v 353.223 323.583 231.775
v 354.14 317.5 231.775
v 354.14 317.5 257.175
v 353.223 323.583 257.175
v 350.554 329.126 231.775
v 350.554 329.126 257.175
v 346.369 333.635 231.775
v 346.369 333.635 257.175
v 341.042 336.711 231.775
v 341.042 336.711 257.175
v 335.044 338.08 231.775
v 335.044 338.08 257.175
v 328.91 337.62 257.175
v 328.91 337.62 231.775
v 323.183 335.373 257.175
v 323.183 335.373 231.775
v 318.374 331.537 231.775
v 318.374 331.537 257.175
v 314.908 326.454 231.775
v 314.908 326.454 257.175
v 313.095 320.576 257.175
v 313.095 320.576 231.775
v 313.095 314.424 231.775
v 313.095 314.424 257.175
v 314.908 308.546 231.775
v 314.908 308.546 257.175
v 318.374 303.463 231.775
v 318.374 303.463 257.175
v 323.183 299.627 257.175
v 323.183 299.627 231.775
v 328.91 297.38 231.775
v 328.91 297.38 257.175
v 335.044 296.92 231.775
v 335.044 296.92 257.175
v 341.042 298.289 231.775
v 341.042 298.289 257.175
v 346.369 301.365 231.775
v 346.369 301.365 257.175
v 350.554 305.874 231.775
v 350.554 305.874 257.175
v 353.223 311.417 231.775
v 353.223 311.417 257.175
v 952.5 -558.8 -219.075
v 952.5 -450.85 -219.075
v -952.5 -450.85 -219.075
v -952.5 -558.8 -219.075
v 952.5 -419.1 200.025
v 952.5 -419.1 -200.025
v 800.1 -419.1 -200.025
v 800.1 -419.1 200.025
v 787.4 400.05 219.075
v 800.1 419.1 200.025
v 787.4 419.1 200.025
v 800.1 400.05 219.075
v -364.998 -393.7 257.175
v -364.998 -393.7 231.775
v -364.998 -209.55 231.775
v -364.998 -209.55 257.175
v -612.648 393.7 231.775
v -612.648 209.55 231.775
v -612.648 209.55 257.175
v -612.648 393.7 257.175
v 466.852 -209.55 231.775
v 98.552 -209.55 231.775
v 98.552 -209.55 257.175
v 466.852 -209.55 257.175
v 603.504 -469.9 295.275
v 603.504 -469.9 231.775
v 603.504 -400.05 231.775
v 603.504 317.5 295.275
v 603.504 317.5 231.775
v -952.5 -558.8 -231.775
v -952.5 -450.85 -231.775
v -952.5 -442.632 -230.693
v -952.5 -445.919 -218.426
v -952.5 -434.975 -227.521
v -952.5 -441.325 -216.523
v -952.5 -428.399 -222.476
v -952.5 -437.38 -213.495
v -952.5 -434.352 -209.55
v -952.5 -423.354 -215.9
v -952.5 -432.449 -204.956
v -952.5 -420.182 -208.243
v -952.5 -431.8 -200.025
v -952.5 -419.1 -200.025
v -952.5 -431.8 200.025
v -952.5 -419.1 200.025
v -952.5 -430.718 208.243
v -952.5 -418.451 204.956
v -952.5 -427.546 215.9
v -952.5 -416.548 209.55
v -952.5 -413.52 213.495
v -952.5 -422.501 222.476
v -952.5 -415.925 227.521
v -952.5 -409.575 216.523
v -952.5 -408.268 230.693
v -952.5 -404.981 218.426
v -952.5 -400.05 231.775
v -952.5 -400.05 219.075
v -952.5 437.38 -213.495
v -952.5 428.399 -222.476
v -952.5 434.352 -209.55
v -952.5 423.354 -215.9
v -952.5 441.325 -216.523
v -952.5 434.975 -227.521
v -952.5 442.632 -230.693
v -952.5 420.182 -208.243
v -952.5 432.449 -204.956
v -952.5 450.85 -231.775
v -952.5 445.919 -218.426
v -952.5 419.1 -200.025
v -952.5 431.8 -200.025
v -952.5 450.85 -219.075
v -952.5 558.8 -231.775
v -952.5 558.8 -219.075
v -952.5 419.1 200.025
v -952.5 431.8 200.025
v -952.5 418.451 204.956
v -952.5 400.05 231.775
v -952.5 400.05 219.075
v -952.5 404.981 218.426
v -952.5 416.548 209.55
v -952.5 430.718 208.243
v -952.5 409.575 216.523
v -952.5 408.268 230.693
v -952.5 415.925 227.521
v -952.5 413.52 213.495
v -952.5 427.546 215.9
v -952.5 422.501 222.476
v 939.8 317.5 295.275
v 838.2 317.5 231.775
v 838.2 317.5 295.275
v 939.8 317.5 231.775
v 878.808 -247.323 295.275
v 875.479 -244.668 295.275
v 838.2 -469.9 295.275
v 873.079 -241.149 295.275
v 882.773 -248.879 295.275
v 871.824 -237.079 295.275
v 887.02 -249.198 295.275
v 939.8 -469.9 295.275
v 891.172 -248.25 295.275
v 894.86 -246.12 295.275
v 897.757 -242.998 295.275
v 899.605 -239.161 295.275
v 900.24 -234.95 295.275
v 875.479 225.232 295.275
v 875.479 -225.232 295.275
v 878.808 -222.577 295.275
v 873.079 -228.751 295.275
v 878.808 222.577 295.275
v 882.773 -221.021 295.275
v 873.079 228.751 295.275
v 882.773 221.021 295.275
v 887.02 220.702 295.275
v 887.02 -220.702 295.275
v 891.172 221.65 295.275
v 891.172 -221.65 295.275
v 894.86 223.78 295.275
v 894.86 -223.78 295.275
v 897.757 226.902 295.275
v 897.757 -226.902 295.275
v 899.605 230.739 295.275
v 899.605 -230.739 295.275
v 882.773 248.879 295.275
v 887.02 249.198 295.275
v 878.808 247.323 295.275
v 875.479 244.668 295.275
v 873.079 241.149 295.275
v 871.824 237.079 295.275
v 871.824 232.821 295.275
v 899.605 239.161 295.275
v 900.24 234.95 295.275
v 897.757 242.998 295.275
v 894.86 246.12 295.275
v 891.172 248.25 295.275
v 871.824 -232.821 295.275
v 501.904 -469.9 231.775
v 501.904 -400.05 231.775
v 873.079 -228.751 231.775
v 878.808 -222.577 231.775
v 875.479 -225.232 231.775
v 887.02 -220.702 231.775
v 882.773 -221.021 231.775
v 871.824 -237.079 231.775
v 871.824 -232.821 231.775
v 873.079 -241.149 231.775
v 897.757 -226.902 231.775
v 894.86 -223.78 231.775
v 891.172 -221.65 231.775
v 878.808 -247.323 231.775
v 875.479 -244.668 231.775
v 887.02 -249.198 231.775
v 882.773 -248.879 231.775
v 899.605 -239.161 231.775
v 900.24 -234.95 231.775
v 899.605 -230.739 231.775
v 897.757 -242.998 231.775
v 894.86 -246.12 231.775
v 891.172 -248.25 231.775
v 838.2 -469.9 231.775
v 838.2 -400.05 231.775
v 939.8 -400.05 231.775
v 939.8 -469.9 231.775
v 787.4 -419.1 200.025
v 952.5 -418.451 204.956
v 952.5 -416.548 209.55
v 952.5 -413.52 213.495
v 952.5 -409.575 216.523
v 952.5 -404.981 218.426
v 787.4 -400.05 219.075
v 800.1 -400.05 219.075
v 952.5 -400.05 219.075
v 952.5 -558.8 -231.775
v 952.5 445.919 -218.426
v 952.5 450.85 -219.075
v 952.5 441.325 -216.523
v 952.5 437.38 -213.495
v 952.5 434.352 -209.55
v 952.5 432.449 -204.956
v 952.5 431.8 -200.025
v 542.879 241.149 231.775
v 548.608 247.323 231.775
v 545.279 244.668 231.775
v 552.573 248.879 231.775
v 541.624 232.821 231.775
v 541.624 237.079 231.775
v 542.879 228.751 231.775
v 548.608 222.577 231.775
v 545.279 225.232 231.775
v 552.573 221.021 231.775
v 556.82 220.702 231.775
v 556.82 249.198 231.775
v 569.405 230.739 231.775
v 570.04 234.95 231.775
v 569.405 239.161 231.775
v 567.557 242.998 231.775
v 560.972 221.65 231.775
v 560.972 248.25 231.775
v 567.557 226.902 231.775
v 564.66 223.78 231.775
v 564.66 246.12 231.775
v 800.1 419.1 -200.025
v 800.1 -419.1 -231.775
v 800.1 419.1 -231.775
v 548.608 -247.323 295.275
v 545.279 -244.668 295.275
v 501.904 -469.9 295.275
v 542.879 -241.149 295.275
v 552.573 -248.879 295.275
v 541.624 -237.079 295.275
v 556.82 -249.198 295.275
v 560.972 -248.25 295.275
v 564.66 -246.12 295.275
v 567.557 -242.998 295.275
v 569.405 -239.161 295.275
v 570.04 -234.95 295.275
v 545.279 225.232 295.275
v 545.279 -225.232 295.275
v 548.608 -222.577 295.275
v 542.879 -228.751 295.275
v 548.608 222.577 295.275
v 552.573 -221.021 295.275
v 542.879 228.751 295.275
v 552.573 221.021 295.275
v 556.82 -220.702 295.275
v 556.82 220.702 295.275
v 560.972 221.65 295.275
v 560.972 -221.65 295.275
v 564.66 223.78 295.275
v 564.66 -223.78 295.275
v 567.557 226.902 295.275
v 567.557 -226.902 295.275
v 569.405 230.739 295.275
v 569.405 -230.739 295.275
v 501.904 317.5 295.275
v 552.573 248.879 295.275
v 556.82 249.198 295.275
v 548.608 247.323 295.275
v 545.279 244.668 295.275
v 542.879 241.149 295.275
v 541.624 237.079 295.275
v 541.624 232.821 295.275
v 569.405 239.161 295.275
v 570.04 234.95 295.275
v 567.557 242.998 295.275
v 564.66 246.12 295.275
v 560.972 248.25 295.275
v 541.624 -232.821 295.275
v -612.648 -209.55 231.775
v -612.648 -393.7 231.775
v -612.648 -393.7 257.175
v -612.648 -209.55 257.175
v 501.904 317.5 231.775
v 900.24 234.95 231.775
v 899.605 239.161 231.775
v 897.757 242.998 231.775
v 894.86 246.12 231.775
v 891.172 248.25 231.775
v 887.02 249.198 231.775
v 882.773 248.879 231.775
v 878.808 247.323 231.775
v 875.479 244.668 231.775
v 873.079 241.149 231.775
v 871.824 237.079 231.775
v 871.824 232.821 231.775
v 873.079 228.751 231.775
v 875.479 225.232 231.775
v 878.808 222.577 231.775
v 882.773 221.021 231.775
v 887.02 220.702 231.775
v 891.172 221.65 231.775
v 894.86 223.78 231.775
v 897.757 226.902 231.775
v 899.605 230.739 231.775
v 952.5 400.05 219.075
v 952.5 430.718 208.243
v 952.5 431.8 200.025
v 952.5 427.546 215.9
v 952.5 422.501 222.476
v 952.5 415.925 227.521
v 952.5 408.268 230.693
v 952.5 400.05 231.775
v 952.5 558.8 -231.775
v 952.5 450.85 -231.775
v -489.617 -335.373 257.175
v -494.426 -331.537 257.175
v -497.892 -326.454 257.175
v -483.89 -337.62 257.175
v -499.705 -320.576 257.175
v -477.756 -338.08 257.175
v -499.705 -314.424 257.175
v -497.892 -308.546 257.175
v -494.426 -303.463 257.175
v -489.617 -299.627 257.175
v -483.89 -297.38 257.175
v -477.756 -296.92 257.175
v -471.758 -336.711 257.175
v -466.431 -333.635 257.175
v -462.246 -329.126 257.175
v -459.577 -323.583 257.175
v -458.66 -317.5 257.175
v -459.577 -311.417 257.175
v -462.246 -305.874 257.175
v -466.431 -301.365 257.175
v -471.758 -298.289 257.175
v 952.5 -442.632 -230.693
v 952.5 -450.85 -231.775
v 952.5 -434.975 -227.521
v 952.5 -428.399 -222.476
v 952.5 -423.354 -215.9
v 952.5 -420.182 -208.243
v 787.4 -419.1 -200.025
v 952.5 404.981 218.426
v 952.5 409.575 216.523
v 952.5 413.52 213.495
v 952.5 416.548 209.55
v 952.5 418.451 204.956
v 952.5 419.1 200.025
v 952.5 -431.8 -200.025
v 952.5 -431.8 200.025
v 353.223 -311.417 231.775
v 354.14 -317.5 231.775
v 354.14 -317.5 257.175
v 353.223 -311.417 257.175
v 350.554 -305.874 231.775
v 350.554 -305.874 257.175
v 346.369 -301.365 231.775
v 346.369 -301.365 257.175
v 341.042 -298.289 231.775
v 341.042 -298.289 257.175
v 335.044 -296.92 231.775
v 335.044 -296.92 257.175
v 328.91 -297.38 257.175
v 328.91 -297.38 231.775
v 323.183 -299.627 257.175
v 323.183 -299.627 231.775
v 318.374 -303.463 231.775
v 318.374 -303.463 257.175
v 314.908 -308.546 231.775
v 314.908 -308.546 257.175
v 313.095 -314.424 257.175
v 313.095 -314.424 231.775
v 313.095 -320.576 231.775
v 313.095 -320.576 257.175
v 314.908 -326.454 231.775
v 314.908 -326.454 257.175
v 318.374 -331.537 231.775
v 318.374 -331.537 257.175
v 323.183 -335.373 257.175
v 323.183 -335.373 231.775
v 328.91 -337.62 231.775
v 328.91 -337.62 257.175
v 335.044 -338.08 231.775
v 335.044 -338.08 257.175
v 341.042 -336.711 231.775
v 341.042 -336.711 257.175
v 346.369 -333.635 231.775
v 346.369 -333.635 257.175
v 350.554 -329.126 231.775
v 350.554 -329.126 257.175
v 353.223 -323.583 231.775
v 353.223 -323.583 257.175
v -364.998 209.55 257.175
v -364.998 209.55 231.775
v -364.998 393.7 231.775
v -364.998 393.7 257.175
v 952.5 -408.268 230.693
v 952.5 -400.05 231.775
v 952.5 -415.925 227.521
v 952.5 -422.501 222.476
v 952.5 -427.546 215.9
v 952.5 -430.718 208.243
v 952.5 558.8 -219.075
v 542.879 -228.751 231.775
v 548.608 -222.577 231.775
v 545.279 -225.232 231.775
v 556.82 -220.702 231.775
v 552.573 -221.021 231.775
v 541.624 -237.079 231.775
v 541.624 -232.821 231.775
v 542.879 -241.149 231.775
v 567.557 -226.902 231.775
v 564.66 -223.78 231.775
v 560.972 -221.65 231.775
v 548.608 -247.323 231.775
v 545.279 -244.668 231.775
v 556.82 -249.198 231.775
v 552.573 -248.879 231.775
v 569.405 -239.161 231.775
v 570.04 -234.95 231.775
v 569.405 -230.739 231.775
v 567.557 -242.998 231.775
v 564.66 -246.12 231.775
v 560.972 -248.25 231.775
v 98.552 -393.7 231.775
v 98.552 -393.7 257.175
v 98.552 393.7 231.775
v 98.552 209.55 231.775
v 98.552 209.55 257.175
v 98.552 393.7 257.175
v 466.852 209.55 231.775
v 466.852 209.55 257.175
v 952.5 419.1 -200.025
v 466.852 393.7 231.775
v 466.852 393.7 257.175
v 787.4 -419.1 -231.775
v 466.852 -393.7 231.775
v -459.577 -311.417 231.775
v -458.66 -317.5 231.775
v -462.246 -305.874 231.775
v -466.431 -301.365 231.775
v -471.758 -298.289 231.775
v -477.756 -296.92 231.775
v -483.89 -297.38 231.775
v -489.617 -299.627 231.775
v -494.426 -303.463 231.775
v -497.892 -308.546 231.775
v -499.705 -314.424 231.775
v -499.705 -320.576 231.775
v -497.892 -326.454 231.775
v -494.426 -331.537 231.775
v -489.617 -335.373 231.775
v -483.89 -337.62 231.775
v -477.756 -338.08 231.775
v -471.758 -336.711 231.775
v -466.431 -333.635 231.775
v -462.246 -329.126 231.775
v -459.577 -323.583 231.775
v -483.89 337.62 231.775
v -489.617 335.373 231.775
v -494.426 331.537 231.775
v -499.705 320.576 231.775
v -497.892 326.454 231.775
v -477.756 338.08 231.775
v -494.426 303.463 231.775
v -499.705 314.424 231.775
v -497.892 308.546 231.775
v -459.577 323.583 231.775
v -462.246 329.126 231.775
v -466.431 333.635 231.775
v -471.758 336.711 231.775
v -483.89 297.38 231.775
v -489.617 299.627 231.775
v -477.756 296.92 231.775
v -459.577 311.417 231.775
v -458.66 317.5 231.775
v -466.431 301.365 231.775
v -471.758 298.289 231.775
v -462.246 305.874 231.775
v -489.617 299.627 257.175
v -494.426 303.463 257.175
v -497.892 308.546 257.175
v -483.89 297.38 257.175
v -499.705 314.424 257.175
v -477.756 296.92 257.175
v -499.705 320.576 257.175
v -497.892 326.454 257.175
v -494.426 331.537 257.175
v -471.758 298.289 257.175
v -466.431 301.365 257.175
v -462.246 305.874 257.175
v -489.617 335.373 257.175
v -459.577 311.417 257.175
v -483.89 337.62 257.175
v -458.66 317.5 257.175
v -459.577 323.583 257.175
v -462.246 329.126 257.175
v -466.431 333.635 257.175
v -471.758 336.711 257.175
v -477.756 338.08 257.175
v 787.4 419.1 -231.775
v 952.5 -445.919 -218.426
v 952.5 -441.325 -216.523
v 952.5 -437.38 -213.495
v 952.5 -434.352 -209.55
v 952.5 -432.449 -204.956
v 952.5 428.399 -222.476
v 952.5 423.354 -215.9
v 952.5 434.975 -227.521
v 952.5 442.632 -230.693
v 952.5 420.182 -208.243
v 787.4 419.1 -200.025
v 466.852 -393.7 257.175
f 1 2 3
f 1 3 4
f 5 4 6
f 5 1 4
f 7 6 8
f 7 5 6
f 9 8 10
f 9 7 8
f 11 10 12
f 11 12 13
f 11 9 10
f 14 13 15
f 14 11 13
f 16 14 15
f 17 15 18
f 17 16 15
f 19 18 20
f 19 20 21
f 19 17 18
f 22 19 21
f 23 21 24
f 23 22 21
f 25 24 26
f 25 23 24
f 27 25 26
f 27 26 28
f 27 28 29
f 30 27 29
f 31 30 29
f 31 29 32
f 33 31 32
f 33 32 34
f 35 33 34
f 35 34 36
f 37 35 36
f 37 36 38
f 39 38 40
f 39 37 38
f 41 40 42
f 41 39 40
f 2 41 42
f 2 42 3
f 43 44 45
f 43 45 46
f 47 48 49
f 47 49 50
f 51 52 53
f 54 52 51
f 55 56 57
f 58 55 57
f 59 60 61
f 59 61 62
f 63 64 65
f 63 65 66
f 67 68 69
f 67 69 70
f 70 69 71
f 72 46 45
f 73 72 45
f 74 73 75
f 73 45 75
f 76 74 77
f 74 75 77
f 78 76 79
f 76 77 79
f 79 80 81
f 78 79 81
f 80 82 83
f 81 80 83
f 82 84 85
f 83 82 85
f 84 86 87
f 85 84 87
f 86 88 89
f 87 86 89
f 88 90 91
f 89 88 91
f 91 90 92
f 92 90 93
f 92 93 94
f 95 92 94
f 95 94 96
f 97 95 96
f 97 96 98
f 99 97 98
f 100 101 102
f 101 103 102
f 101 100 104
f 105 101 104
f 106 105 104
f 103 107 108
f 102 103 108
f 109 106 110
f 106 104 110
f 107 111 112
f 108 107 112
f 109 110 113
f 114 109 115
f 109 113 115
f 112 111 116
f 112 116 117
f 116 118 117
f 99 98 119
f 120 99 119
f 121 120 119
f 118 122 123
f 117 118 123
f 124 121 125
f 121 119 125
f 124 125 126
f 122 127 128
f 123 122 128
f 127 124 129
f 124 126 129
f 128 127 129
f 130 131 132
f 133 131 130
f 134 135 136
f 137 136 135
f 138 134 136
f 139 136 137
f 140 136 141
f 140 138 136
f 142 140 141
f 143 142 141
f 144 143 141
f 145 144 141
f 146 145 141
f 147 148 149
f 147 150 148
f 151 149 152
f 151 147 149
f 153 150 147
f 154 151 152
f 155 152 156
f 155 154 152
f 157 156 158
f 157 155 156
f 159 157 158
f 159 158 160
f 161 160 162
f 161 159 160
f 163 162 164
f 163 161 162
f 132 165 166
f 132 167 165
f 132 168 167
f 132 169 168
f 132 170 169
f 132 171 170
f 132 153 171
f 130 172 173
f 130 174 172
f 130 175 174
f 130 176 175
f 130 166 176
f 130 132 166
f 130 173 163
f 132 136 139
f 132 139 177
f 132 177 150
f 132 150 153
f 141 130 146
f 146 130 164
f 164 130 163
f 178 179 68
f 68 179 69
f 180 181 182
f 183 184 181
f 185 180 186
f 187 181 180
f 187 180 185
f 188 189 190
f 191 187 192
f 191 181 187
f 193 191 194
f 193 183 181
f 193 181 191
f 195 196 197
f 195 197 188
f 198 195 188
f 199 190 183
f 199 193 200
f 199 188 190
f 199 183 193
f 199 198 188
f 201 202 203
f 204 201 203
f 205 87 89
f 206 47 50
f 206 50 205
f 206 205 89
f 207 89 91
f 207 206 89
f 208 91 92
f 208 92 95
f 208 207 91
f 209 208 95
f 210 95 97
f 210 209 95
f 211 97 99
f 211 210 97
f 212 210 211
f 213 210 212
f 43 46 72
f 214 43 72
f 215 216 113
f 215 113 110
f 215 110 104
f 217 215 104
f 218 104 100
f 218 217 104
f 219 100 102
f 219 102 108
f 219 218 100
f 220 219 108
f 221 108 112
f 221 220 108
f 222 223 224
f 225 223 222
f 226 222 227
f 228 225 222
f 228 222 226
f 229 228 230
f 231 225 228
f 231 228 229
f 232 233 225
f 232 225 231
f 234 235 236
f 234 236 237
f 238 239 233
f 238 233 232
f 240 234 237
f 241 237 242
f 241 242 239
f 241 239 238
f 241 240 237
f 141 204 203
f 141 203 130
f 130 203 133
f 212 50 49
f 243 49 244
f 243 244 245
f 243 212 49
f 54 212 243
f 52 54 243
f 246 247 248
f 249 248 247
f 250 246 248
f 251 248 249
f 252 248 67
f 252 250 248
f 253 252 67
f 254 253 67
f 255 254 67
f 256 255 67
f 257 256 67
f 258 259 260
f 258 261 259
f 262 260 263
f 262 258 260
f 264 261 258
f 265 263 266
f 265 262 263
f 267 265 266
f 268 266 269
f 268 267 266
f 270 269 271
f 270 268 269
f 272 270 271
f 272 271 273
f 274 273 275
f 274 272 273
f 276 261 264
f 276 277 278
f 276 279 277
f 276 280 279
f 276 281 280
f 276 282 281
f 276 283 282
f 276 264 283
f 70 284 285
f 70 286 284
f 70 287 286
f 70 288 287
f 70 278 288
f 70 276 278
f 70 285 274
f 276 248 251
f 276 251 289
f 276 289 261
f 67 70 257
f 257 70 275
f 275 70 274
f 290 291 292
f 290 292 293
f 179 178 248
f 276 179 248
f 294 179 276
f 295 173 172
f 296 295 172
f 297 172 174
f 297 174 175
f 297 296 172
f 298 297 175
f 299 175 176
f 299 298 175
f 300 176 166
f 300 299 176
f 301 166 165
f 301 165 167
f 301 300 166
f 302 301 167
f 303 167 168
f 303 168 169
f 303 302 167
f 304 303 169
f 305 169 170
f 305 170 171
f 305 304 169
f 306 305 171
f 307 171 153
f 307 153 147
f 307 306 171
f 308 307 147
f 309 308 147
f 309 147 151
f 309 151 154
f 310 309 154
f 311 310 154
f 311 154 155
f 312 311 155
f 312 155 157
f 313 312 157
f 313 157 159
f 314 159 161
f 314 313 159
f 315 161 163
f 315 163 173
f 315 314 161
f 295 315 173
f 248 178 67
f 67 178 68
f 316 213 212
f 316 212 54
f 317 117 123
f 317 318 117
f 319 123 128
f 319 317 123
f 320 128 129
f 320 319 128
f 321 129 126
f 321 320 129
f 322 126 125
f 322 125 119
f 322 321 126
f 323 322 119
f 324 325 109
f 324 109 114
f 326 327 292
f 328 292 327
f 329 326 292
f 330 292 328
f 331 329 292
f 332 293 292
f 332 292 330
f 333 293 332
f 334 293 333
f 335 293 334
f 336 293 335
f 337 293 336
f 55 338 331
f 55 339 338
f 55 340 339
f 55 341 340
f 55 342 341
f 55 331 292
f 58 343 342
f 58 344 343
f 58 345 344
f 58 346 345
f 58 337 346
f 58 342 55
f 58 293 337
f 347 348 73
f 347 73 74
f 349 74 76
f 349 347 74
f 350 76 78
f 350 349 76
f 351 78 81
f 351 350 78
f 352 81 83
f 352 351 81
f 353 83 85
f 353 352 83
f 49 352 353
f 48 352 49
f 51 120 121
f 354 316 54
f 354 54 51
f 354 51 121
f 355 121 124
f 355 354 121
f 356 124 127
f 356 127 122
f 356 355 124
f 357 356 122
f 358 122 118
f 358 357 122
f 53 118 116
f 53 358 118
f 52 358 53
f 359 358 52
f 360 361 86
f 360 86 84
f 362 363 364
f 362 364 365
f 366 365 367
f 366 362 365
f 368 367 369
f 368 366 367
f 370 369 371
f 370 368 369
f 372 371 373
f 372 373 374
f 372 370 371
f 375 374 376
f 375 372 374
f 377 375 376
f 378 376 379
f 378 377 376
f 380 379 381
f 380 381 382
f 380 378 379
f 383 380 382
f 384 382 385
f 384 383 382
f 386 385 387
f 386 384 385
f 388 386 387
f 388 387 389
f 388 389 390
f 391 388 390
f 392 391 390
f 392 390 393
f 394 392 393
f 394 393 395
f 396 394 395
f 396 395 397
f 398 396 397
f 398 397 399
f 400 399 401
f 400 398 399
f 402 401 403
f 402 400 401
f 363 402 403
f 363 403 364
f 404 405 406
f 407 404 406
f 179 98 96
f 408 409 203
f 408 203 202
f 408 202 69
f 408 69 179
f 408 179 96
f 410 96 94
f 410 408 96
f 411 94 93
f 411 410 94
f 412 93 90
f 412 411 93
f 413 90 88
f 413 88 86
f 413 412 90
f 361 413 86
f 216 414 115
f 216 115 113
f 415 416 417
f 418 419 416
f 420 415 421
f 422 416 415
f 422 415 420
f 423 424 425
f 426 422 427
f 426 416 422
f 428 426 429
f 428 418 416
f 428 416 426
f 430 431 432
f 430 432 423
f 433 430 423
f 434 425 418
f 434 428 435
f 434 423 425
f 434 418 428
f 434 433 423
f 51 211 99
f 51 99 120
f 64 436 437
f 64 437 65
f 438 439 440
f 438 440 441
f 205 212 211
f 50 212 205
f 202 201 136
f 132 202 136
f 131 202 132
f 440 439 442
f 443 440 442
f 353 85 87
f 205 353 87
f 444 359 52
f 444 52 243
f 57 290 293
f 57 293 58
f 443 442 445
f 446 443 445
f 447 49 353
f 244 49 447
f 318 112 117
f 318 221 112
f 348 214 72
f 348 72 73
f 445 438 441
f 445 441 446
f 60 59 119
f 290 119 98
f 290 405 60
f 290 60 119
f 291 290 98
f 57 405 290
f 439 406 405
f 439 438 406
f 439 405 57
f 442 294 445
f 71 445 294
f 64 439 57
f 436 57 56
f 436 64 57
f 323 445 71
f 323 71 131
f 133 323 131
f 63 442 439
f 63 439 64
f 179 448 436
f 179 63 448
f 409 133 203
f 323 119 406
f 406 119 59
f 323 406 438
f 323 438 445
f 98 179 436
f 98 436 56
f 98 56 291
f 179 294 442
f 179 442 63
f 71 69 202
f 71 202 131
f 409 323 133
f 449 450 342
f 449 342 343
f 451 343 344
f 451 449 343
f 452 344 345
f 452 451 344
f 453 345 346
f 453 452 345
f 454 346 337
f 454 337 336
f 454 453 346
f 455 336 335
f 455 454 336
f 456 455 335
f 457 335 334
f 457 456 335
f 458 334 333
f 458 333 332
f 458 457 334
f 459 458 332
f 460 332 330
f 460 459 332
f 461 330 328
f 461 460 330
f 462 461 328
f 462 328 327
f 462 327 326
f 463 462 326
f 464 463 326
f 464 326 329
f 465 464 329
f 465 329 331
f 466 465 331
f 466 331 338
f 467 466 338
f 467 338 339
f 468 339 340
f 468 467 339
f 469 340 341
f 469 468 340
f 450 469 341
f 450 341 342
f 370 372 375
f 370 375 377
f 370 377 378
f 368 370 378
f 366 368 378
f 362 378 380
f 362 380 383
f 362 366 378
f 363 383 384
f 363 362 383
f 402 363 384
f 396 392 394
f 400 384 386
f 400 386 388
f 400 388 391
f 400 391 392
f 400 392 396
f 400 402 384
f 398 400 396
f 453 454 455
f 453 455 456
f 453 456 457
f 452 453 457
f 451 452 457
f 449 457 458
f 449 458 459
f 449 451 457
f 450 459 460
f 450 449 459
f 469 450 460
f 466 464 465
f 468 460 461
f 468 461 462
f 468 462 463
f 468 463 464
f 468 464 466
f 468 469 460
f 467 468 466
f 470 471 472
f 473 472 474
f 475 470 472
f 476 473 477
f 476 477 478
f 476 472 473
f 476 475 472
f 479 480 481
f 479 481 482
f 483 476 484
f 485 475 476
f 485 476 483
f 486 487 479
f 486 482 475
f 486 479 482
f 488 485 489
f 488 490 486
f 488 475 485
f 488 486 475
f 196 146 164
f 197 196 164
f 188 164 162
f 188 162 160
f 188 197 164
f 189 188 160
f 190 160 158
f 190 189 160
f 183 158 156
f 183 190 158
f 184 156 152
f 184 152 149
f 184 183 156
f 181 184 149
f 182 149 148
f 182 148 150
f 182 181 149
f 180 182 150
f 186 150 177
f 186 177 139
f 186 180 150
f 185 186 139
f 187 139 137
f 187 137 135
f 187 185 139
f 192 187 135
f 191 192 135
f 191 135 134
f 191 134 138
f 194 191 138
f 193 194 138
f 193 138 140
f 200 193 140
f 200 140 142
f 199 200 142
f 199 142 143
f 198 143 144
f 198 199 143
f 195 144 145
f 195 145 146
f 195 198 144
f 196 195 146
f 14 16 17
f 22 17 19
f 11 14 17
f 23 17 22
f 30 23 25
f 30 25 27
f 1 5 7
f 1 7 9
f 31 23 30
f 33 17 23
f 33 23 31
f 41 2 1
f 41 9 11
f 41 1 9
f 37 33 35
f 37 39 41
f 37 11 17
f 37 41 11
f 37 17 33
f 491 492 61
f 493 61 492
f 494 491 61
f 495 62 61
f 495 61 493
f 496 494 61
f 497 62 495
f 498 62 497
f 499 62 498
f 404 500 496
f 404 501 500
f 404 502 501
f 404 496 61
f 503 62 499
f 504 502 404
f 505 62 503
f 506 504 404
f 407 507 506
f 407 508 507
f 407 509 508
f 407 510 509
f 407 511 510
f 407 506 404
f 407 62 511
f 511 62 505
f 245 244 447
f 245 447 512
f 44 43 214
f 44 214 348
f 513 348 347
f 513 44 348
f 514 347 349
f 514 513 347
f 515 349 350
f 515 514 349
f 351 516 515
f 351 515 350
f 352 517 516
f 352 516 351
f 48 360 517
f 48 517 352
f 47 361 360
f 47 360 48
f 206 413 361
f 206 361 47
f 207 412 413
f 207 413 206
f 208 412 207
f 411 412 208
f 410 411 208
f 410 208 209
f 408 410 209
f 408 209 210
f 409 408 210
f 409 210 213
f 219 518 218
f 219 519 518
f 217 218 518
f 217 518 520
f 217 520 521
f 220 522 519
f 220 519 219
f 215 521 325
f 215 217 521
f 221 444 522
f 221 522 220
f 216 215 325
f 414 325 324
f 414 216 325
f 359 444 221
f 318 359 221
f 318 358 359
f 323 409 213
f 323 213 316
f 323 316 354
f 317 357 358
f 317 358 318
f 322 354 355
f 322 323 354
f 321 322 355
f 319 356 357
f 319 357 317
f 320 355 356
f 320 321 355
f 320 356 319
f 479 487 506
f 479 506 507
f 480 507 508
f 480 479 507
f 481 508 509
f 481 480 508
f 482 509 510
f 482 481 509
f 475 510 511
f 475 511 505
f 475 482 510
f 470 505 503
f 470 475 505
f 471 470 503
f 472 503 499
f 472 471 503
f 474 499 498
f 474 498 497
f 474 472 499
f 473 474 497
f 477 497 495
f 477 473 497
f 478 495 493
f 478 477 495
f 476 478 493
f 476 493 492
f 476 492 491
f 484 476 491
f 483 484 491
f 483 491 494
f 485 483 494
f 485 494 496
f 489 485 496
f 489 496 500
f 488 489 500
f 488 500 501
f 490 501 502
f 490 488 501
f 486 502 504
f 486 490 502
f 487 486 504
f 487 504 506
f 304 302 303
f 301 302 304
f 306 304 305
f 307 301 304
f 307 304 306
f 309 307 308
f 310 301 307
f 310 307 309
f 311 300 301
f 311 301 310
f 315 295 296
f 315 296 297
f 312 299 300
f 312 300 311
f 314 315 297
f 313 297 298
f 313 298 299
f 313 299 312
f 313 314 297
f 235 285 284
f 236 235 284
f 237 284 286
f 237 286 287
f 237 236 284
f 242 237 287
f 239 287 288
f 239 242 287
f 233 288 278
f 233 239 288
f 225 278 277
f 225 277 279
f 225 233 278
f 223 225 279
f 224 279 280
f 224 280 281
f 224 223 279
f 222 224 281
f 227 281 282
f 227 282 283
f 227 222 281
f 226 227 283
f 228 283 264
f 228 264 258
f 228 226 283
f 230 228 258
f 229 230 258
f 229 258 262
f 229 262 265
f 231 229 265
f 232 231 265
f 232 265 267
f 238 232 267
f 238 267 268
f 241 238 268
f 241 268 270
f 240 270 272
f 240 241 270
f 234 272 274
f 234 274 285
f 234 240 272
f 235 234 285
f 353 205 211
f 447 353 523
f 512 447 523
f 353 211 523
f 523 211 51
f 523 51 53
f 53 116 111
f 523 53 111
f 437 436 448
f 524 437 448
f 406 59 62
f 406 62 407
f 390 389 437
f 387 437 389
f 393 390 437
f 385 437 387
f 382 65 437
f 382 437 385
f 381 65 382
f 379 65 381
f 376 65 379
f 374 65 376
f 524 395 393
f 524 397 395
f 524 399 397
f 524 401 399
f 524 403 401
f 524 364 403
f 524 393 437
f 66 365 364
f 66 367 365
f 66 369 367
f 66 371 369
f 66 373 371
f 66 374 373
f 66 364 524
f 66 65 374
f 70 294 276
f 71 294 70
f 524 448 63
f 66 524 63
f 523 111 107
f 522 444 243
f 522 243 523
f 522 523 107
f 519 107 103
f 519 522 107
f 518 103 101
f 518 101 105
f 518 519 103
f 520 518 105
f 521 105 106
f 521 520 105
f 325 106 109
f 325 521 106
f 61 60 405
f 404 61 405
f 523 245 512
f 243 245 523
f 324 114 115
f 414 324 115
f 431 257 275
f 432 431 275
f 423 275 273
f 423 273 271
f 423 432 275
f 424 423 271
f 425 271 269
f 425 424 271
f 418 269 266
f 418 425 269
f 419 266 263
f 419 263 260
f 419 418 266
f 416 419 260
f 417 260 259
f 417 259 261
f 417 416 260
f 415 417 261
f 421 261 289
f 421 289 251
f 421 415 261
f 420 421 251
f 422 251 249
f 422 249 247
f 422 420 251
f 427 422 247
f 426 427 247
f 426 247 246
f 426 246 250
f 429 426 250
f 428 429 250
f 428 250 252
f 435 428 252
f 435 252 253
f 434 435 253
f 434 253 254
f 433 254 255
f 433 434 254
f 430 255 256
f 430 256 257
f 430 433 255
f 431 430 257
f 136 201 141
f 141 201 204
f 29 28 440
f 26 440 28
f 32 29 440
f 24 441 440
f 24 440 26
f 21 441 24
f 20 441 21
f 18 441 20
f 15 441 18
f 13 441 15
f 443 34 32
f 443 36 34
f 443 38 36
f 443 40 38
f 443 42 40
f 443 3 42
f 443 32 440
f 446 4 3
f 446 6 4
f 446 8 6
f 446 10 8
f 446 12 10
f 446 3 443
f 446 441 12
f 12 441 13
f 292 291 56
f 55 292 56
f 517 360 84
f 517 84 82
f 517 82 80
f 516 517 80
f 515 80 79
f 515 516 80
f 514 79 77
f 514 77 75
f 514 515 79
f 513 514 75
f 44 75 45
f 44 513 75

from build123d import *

# Parameters (mm, degrees)
F1_DEPTH = 952.5
F2_W     = 101.6
F2_H     = 787.4
F2_R     = 14.2875
F3_DEPTH = 63.5
F4_W     = 368.3
F4_H     = 184.15
F4_R     = 20.6375
F4_W_2   = 247.65
F5_DEPTH = 25.4
F8_DEPTH = 12.7


with BuildPart() as f1:
    # F0 (on Right) → F1 (new body, symmetric)
    with BuildSketch(Plane.YZ):
        with BuildLine():
            Line((400.05, 231.775), (-400.05, 231.775))
            ThreePointArc((-400.05, 231.775), (-422.5006403027, 222.4756403027), (-431.8, 200.025))
            Line((-431.8, 200.025), (-431.8, -200.025))
            ThreePointArc((-431.8, -200.025), (-437.3796158184, -213.4953841816), (-450.85, -219.075))
            Line((-450.85, -219.075), (-558.8, -219.075))
            Line((-558.8, -219.075), (-558.8, -231.775))
            Line((-558.8, -231.775), (-450.85, -231.775))
            ThreePointArc((-450.85, -231.775), (-428.3993596973, -222.4756403027), (-419.1, -200.025))
            Line((-419.1, -200.025), (-419.1, 200.025))
            ThreePointArc((-419.1, 200.025), (-413.5203841816, 213.4953841816), (-400.05, 219.075))
            Line((-400.05, 219.075), (400.05, 219.075))
            ThreePointArc((400.05, 219.075), (413.5203841816, 213.4953841816), (419.1, 200.025))
            Line((419.1, 200.025), (419.1, -200.025))
            ThreePointArc((419.1, -200.025), (428.3993596973, -222.4756403027), (450.85, -231.775))
            Line((450.85, -231.775), (558.8, -231.775))
            Line((558.8, -231.775), (558.8, -219.075))
            Line((558.8, -219.075), (450.85, -219.075))
            ThreePointArc((450.85, -219.075), (437.3796158184, -213.4953841816), (431.8, -200.025))
            Line((431.8, -200.025), (431.8, 200.025))
            ThreePointArc((431.8, 200.025), (422.5006403027, 222.4756403027), (400.05, 231.775))
        make_face()
    extrude(amount=F1_DEPTH, both=True)

    # F2 (on face) → F3 (join)
    with BuildSketch(Plane.XY.offset(231.775)):
        with Locations((889, -76.2)):
            Rectangle(F2_W, F2_H)
        with Locations((885.952, -234.95)):
            Circle(F2_R, mode=Mode.SUBTRACT)
        with Locations((885.952, 234.95)):
            Circle(F2_R, mode=Mode.SUBTRACT)
        with Locations((552.704, -76.2)):
            Rectangle(F2_W, F2_H)
        with Locations((555.752, -234.95)):
            Circle(F2_R, mode=Mode.SUBTRACT)
        with Locations((555.752, 234.95)):
            Circle(F2_R, mode=Mode.SUBTRACT)
    extrude(amount=F3_DEPTH)

    # F4 (on face) → F5 (join)
    with BuildSketch(Plane.XY.offset(231.775)):
        with Locations((282.702, -301.625)):
            Rectangle(F4_W, F4_H)
        with Locations((333.502, -317.5)):
            Circle(F4_R, mode=Mode.SUBTRACT)
        with Locations((-488.823, -301.625)):
            Rectangle(F4_W_2, F4_H)
        with Locations((-479.298, -317.5)):
            Circle(F4_R, mode=Mode.SUBTRACT)
        with Locations((-488.823, 301.625)):
            Rectangle(F4_W_2, F4_H)
        with Locations((-479.298, 317.5)):
            Circle(F4_R, mode=Mode.SUBTRACT)
        with Locations((282.702, 301.625)):
            Rectangle(F4_W, F4_H)
        with Locations((333.502, 317.5)):
            Circle(F4_R, mode=Mode.SUBTRACT)
    extrude(amount=F5_DEPTH)

    # F7 (on offset) → F8 (join)
    with BuildSketch(Plane.YZ.offset(800.1)):
        Polygon((400.05, 219.075), (-400.05, 219.075), (-419.1, 200.025), (-419.1, -231.775), (419.1, -231.775), (419.1, 200.025), align=None)
    extrude(amount=-F8_DEPTH)


solid = f1.part
